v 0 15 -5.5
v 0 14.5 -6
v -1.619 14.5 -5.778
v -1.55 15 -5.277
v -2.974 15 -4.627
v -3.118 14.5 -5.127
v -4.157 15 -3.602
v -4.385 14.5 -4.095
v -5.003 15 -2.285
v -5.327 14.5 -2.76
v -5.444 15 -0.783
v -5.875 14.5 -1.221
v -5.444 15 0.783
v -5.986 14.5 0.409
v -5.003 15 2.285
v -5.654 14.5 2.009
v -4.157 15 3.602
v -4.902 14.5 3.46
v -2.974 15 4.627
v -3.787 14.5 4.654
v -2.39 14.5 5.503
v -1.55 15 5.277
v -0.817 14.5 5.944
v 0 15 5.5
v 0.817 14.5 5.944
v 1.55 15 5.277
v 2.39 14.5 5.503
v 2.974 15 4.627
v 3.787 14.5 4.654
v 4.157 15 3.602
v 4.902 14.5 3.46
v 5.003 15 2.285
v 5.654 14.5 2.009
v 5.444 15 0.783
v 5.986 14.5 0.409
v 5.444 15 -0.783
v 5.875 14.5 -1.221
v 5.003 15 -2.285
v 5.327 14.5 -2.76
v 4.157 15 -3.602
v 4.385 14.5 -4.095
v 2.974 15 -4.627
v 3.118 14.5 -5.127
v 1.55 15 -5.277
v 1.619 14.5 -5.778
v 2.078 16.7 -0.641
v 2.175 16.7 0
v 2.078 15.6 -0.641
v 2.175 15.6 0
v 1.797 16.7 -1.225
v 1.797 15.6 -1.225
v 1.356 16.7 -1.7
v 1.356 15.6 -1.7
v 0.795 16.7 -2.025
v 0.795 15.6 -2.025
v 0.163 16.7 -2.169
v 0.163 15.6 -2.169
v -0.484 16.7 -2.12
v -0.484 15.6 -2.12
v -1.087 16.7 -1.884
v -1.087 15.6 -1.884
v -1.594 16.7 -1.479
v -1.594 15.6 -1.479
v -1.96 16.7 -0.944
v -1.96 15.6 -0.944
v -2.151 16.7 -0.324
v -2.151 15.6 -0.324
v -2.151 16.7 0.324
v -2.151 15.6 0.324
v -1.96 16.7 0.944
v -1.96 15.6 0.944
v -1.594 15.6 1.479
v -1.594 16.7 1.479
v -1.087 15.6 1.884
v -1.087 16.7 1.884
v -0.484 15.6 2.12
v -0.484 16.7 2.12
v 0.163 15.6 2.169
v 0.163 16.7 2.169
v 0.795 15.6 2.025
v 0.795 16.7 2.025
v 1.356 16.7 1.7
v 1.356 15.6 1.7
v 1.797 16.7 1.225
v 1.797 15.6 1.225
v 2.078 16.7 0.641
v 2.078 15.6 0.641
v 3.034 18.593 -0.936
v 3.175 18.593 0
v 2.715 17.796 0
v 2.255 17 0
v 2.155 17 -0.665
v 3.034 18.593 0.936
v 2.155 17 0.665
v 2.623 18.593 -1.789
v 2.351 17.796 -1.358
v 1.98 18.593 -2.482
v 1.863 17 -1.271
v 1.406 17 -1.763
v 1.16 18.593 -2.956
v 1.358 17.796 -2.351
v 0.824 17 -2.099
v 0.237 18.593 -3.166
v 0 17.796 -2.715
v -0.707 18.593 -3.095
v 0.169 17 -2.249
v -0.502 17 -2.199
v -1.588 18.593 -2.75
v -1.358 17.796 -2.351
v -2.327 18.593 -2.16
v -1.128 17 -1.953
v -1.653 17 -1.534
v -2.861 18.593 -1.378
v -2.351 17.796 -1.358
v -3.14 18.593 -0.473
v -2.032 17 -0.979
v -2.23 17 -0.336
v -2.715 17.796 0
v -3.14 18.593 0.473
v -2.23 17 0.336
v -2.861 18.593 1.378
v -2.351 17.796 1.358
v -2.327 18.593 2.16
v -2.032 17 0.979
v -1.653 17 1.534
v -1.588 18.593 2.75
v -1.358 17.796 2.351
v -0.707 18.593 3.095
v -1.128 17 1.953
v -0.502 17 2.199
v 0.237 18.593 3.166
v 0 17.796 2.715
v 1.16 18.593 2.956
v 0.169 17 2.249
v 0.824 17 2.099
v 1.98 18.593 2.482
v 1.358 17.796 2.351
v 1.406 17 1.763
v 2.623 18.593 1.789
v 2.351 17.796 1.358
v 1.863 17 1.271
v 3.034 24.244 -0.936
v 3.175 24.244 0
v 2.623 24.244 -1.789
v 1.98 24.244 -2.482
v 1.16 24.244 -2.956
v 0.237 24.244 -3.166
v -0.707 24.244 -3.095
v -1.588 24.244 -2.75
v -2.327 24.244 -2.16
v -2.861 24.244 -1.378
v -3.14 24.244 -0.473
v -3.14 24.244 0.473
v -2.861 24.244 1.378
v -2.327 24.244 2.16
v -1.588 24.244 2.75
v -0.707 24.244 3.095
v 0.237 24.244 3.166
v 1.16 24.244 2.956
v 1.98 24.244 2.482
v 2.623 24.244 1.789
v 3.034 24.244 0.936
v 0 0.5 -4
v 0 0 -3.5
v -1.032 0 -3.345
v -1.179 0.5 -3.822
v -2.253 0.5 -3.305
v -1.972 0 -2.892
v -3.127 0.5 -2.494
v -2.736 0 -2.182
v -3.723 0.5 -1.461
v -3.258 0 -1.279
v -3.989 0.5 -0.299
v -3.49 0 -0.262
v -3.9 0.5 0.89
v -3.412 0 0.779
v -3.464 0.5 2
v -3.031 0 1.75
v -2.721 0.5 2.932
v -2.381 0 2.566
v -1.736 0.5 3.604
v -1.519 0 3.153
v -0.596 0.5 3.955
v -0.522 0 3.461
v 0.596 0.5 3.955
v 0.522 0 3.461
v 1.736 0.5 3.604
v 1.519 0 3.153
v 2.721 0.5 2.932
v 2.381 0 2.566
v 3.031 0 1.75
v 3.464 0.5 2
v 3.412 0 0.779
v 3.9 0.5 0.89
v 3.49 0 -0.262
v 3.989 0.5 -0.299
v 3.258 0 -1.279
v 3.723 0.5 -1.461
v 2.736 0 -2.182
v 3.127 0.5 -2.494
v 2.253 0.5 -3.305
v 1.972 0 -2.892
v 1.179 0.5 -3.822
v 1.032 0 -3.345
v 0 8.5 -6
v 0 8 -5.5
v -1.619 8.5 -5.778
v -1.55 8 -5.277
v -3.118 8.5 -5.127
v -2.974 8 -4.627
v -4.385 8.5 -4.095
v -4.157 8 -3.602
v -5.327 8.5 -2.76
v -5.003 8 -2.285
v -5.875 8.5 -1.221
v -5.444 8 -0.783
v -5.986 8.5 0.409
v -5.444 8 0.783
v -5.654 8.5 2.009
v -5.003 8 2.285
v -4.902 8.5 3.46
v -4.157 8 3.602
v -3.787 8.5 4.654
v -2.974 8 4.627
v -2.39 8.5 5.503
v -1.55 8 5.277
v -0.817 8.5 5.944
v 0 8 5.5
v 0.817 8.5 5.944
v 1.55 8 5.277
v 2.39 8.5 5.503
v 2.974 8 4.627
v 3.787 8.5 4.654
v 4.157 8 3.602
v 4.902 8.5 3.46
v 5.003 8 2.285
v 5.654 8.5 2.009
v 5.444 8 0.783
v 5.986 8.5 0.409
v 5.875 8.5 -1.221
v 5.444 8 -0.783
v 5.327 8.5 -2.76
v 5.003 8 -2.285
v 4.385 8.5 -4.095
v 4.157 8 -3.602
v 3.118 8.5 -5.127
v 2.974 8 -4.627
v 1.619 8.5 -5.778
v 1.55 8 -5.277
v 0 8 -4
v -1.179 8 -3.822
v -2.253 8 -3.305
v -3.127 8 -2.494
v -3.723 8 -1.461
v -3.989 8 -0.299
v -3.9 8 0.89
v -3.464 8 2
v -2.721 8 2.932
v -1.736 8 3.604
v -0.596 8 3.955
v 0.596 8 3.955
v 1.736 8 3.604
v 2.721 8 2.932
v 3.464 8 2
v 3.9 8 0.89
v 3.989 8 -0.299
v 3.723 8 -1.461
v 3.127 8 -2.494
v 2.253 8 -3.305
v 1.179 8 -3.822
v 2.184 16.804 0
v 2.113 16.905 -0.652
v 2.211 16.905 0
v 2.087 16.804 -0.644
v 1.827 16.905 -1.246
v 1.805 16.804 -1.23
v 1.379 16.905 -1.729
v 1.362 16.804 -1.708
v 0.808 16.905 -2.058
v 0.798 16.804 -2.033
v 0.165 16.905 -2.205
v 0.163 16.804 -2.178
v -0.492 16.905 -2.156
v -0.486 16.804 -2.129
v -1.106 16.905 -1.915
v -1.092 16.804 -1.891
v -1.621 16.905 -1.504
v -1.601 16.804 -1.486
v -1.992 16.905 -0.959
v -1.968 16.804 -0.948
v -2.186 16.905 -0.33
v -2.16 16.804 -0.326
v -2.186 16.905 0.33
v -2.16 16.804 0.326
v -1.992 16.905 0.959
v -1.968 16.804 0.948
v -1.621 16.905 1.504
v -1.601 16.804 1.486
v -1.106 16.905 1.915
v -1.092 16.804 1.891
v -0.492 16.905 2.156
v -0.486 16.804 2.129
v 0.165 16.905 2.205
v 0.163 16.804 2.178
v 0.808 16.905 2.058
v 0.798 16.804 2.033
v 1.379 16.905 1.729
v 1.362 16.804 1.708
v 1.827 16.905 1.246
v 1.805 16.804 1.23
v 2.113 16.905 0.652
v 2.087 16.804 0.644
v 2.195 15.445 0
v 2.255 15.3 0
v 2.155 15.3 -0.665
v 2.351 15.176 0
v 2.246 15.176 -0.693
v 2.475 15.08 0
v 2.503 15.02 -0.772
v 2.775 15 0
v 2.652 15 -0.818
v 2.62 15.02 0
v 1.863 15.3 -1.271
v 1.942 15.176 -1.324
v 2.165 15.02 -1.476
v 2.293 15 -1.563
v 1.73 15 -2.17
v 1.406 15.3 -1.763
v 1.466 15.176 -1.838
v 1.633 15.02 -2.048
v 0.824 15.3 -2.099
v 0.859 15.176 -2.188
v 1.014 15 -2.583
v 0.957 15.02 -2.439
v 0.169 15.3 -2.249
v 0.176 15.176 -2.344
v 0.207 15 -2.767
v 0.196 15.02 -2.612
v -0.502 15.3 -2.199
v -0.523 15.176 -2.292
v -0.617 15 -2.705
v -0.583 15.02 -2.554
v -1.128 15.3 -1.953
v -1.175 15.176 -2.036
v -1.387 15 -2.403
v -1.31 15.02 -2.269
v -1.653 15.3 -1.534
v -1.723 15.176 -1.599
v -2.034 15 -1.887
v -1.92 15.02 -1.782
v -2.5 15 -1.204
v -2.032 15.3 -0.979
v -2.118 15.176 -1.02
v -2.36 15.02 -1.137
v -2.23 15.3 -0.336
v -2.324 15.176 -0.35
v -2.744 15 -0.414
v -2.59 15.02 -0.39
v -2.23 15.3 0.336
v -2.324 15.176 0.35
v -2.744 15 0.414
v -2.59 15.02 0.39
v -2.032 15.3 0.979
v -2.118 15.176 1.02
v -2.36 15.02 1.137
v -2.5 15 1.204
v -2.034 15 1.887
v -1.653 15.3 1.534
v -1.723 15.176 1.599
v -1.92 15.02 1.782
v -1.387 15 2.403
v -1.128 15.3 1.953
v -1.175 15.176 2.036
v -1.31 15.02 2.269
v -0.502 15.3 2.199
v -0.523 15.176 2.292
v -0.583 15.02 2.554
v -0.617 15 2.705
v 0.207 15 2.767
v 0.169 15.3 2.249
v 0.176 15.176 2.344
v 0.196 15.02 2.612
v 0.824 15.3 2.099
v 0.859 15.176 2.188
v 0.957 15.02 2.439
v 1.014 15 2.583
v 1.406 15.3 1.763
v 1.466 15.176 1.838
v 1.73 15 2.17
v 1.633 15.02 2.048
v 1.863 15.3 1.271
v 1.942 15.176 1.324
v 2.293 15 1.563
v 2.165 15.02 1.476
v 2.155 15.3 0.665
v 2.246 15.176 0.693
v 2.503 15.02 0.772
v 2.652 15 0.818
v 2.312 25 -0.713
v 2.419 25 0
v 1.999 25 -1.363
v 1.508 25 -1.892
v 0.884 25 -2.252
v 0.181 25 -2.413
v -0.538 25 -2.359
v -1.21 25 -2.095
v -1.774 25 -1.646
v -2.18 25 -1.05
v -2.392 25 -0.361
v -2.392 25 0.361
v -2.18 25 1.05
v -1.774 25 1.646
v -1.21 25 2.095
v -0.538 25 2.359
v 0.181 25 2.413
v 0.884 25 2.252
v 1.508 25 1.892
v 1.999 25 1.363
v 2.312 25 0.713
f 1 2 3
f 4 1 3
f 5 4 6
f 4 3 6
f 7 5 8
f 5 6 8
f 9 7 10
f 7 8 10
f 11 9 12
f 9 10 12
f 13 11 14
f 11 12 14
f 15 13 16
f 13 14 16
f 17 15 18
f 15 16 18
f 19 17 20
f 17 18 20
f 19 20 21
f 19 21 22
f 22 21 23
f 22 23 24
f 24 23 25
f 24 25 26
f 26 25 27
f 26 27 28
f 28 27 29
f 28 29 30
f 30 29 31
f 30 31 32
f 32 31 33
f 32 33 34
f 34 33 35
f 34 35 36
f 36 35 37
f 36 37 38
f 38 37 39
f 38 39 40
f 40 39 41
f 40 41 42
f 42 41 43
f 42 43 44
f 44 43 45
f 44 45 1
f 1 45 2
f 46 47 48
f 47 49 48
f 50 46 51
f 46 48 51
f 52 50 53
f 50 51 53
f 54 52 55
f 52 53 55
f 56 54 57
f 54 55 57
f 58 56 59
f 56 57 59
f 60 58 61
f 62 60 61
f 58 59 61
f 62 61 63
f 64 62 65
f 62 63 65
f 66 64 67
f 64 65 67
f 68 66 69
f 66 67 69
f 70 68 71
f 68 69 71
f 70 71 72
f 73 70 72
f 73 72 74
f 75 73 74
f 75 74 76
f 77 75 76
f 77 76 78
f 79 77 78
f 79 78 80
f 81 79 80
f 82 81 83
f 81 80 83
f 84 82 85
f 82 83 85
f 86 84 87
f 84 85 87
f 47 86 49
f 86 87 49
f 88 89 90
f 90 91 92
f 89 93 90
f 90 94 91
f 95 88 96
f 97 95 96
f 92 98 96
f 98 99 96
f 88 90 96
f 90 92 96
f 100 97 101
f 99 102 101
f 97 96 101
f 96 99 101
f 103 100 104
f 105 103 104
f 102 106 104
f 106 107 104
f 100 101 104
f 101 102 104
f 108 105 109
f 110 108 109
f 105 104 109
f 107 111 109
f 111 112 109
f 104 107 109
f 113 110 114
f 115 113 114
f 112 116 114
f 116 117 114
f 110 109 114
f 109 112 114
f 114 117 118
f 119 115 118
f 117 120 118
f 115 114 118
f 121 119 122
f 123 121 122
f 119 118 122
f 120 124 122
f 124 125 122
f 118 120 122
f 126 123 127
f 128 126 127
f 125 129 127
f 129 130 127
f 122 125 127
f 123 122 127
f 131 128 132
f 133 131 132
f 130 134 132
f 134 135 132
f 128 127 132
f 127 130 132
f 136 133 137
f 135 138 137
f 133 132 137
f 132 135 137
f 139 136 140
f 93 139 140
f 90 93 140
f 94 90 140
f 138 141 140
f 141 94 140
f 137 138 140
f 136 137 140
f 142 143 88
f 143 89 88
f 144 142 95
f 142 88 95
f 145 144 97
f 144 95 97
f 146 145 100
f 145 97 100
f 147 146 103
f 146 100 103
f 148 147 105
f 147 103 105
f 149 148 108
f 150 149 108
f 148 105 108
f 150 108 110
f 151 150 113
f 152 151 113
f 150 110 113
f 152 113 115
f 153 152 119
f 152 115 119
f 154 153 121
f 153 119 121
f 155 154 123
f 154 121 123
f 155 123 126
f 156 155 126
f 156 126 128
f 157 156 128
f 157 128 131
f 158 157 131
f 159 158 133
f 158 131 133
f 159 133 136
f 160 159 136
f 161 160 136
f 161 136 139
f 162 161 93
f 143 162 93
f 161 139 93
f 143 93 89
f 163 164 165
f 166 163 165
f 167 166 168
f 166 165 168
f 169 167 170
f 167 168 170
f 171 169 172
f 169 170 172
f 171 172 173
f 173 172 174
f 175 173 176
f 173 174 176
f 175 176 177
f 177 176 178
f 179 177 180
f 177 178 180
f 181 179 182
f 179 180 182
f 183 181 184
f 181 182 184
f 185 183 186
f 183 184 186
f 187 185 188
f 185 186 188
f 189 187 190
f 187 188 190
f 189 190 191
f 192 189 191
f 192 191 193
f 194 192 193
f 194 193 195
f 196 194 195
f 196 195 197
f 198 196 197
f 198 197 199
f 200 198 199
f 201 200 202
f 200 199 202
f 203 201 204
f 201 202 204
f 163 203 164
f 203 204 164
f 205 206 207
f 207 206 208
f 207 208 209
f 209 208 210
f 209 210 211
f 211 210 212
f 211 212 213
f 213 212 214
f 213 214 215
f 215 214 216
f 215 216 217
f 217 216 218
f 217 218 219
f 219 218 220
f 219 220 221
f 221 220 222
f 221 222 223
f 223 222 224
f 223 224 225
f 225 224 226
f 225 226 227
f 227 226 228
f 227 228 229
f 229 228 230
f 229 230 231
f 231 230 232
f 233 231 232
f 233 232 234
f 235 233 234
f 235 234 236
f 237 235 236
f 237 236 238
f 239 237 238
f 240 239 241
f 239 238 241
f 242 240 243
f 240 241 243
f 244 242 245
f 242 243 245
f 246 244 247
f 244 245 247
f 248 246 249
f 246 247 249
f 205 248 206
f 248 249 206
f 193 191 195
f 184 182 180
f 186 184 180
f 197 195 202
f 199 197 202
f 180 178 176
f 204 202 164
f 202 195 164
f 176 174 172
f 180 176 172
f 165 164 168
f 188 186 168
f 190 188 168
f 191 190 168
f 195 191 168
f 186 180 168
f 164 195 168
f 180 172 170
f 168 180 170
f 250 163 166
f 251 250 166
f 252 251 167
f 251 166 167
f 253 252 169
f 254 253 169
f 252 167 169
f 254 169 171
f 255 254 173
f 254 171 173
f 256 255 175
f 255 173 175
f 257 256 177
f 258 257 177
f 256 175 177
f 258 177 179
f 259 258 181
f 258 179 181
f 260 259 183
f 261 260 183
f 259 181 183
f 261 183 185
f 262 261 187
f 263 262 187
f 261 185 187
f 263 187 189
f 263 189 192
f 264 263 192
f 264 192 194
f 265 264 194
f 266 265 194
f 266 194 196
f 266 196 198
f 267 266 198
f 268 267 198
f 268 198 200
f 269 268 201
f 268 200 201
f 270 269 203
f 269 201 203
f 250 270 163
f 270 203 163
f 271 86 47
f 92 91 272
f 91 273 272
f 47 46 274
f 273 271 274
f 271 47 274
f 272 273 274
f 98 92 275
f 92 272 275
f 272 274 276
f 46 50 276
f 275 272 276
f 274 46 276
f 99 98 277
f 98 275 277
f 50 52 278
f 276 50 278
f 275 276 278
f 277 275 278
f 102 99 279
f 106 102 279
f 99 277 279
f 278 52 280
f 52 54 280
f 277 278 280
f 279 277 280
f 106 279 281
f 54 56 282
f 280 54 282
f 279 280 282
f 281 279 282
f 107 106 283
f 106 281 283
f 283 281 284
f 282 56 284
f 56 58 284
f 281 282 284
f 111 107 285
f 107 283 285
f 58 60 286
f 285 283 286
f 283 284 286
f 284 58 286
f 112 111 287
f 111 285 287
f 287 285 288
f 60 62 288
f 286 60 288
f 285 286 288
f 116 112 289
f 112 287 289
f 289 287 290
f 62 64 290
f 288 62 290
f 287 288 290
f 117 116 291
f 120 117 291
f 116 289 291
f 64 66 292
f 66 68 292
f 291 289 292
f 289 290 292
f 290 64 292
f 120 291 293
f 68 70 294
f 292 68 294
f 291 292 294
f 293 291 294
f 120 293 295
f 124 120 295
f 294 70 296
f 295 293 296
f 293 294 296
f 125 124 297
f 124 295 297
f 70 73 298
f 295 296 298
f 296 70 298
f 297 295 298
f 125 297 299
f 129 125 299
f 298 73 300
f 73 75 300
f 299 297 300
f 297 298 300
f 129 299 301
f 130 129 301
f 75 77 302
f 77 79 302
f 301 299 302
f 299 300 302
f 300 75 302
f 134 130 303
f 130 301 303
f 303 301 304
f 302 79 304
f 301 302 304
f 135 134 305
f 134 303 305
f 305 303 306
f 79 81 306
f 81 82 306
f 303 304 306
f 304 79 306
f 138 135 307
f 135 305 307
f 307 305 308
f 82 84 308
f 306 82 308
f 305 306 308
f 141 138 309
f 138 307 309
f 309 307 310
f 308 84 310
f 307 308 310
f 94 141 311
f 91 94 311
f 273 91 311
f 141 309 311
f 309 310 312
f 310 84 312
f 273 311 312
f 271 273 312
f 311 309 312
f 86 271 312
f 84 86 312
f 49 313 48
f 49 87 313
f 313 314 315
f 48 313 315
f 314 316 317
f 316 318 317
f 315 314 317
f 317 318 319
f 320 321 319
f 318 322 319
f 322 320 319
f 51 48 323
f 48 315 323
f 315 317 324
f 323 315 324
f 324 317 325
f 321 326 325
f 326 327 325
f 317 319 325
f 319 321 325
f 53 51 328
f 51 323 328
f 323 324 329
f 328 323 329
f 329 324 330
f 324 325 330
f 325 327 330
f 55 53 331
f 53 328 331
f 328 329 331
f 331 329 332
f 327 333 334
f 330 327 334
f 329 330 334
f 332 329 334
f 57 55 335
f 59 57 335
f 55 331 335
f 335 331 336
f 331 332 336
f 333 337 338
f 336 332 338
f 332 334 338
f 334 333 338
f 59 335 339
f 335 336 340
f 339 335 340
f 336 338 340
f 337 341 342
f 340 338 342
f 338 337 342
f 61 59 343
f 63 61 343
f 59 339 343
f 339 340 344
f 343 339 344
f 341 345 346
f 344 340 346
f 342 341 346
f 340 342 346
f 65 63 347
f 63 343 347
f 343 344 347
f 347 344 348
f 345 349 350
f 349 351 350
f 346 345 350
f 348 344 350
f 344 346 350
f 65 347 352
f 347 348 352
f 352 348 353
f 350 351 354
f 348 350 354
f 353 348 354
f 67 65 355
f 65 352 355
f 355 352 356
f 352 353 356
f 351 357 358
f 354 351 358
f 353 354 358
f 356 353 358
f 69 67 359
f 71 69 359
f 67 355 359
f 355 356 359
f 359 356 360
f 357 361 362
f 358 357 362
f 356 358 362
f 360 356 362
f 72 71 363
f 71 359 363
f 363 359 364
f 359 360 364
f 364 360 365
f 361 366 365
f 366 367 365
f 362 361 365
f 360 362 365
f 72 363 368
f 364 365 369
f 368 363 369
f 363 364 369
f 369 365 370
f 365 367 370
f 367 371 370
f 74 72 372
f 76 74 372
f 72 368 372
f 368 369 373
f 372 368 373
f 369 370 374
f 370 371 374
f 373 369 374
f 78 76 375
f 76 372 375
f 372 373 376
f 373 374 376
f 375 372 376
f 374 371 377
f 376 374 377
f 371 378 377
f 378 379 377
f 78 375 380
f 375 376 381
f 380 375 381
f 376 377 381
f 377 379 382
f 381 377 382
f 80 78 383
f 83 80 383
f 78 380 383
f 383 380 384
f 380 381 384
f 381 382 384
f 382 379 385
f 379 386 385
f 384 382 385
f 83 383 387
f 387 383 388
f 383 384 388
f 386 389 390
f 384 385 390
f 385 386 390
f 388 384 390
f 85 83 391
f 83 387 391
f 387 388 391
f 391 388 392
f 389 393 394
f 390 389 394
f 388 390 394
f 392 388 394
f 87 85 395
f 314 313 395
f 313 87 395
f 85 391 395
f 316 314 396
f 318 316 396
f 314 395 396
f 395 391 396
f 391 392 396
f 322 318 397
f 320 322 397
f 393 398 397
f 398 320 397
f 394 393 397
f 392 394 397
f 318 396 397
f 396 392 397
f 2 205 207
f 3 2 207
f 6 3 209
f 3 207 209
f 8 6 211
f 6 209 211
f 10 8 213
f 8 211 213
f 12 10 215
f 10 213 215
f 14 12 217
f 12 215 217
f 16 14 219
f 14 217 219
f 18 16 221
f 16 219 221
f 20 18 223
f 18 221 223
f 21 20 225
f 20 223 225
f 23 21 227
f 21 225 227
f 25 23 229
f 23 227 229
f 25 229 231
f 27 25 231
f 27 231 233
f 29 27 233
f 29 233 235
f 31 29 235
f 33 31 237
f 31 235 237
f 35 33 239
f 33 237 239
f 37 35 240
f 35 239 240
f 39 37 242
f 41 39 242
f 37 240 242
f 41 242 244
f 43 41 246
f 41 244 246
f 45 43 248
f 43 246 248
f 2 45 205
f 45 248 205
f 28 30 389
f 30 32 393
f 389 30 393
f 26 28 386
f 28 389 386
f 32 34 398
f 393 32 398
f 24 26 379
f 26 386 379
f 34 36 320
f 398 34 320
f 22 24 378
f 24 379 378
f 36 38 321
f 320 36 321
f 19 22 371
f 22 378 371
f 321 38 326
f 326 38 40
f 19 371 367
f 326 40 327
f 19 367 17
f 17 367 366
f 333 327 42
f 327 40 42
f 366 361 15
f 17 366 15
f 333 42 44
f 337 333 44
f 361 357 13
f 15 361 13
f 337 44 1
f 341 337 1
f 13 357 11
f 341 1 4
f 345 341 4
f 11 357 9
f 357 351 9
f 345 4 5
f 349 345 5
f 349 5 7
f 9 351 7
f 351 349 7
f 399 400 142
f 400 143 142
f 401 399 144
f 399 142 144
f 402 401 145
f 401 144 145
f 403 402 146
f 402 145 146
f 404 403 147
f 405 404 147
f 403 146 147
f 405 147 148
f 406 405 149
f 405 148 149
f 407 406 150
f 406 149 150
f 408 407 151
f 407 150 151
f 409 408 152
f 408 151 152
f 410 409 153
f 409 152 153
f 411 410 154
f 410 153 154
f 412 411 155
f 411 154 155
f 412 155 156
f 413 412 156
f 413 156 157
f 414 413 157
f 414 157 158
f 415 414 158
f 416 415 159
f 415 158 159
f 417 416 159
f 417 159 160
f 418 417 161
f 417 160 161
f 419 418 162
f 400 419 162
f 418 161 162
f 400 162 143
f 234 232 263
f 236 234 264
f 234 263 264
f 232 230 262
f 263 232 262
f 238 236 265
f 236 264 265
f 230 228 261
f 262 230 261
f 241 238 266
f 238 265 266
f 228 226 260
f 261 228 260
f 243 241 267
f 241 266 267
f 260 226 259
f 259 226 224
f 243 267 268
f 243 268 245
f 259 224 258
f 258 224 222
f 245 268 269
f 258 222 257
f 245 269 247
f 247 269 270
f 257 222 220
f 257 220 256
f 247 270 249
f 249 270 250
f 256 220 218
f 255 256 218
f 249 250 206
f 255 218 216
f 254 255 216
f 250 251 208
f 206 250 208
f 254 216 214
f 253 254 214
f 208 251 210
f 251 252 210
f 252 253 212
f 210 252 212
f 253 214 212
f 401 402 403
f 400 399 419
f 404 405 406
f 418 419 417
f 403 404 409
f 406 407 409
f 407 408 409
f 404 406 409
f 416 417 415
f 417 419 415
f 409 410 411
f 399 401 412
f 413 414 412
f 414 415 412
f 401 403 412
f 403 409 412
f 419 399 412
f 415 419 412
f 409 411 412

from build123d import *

# Parameters (mm, degrees)
CHAMFER1_SIZE = 0.5


# Read off the part's stored shape, not the designer's step: 1/4-20 Machine Threads Stud1
with BuildPart() as part:
    # Sketch1 → Revolve1 (revolve)
    with BuildSketch(Plane.XY, mode=Mode.PRIVATE) as revolve1_sk:
        Polygon((0, 0), (0, 25), (-4, 25), (-4, 15), (-6, 15), (-6, 8), (-4, 8), (-4, 0), align=None)
    revolve(revolve1_sk.sketch.rotate(Axis((0, 0, 0), (0, 1, 0)), 270), axis=Axis((0, 0, 0), (0, 1, 0)))

    # 1/4-20 Machine Threads Stud1 outline → 1/4-20 Machine Threads Stud1 (revolve, cut)
    with BuildSketch(Plane.XY):
        with BuildLine():
            Line((2.774999784, 15), (4, 15))
            Line((4, 15), (4, 25))
            Line((4, 25), (2.41935, 25))
            Line((2.41935, 25), (3.175, 24.24435))
            Line((3.175, 24.24435), (3.175, 18.592822263))
            Line((3.175, 18.592822263), (2.255384261, 17.00000108))
            ThreePointArc((2.255384261, 17.00000108), (2.195443975, 16.855292429), (2.17499946, 16.700000918))
            Line((2.17499946, 16.700000918), (2.17499946, 15.600000324))
            ThreePointArc((2.17499946, 15.600000324), (2.350735486, 15.175736026), (2.774999784, 15))
        make_face()
    revolve(axis=Axis((0, 0, 0), (0, 1, 0)), mode=Mode.SUBTRACT)

    # Chamfer1
    chamfer1_edges = [part.edges().sort_by_distance(p)[0] for p in [
        (0, 0, 4),
        (0, 8, 6),
        (0, 15, 6),
    ]]
    chamfer(chamfer1_edges, length=CHAMFER1_SIZE)


solid = part.part
